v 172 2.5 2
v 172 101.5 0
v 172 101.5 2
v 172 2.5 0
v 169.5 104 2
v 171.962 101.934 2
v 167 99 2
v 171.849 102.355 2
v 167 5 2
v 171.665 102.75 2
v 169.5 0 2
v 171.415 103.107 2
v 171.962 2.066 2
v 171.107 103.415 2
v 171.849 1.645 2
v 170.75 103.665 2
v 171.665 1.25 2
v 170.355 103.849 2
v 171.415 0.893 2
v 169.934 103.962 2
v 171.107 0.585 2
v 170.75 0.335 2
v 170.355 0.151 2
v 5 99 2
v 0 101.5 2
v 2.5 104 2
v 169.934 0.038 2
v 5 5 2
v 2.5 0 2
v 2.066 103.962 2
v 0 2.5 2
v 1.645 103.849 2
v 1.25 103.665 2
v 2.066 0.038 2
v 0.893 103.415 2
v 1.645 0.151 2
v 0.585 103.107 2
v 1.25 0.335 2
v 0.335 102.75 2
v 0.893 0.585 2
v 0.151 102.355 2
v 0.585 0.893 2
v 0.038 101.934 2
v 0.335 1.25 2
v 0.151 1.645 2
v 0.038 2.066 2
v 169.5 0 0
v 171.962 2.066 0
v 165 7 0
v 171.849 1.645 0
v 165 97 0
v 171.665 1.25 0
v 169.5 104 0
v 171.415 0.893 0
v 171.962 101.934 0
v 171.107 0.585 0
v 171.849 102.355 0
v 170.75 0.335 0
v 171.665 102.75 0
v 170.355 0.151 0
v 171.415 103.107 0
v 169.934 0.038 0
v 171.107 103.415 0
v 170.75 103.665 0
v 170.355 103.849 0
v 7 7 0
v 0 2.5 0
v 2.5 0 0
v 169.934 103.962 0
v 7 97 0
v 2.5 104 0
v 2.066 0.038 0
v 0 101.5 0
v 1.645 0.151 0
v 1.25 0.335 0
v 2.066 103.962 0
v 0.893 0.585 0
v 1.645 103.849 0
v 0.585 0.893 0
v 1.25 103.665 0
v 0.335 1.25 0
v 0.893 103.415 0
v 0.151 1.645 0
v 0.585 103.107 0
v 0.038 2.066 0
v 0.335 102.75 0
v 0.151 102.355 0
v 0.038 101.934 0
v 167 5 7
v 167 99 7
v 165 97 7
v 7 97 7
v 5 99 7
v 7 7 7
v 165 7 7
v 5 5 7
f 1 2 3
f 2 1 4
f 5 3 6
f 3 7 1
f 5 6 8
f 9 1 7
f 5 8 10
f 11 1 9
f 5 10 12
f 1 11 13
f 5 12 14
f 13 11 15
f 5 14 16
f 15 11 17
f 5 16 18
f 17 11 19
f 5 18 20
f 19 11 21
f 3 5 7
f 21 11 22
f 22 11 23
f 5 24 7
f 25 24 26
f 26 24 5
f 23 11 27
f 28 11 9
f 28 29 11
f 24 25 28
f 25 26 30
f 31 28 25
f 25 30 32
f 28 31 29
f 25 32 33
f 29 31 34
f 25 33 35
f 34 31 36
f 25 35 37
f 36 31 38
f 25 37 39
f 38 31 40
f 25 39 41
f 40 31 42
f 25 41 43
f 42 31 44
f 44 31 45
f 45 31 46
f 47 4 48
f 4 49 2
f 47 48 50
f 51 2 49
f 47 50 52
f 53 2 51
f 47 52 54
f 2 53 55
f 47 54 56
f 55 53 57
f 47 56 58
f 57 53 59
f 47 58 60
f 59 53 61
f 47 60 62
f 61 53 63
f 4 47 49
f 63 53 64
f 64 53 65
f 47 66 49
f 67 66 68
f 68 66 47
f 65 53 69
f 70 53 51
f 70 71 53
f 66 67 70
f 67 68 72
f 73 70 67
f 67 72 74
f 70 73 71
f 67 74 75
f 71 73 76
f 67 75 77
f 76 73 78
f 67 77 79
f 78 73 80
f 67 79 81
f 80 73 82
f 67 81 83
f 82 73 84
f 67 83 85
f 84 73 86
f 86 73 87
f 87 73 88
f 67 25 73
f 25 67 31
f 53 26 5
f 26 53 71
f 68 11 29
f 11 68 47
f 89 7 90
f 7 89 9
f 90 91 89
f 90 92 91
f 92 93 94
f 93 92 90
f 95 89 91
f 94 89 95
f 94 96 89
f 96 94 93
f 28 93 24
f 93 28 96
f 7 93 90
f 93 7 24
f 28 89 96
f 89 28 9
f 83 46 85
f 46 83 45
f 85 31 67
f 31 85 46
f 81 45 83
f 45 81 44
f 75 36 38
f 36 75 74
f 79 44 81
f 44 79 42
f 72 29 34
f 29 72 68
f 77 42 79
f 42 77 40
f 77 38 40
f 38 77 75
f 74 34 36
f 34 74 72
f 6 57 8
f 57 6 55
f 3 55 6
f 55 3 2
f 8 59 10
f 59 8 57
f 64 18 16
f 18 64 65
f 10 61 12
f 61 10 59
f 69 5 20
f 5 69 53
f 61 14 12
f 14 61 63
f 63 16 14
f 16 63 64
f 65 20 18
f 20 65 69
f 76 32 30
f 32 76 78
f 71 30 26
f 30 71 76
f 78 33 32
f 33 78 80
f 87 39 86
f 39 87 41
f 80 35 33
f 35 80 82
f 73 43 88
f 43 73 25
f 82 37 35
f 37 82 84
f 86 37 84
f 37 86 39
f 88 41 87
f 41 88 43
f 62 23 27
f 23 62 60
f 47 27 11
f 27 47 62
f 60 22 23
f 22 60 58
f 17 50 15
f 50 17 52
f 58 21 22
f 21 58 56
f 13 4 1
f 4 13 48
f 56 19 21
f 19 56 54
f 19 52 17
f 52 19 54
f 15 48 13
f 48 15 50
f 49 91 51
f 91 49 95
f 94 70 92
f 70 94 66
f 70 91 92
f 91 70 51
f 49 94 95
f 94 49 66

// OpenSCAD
aperture_width = 162;
aperture_height = 94;
frame_thickness = 2;
outer_frame_width = 5;
lip_depth = 5;
rounded_corners = true;

/* [Hidden] */
$fn = 36;

frame_total_width = aperture_width + (2 * outer_frame_width);
frame_total_height = aperture_height + (2 * outer_frame_width);

half_frame_width = outer_frame_width / 2;

module RoundedCorner() {
    intersection() {
        cylinder(r1=half_frame_width, r2=half_frame_width, frame_thickness);

        cube([
            half_frame_width,
            half_frame_width,
            frame_thickness
        ]);
    }
}

module RoundedCornerMask() {
    difference() {
        cube([half_frame_width+1, half_frame_width+1, frame_thickness]);
        RoundedCorner();
    }
}

difference() {
    union() {
        cube([frame_total_width, frame_total_height, frame_thickness]);
        translate([outer_frame_width, outer_frame_width, frame_thickness]) cube([aperture_width, aperture_height, lip_depth]);
    };
    
    translate([
        outer_frame_width + frame_thickness,
        outer_frame_width + frame_thickness,
        0
    ]) {
        cube([
            aperture_width - (2 * frame_thickness),
            aperture_height - (2 * frame_thickness),
            frame_thickness + lip_depth + 2
        ]);
    }
    
    if (rounded_corners) {
        translate([half_frame_width, half_frame_width, 0]) rotate([0, 0, 180]) RoundedCornerMask();
        translate([frame_total_width - half_frame_width, frame_total_height - half_frame_width, 0]) rotate([0, 0, 0]) RoundedCornerMask();
        translate([half_frame_width, frame_total_height - half_frame_width, 0]) rotate([0, 0, 90]) RoundedCornerMask();
        translate([frame_total_width - half_frame_width, half_frame_width, 0]) rotate([0, 0, 270]) RoundedCornerMask();
    }
}
